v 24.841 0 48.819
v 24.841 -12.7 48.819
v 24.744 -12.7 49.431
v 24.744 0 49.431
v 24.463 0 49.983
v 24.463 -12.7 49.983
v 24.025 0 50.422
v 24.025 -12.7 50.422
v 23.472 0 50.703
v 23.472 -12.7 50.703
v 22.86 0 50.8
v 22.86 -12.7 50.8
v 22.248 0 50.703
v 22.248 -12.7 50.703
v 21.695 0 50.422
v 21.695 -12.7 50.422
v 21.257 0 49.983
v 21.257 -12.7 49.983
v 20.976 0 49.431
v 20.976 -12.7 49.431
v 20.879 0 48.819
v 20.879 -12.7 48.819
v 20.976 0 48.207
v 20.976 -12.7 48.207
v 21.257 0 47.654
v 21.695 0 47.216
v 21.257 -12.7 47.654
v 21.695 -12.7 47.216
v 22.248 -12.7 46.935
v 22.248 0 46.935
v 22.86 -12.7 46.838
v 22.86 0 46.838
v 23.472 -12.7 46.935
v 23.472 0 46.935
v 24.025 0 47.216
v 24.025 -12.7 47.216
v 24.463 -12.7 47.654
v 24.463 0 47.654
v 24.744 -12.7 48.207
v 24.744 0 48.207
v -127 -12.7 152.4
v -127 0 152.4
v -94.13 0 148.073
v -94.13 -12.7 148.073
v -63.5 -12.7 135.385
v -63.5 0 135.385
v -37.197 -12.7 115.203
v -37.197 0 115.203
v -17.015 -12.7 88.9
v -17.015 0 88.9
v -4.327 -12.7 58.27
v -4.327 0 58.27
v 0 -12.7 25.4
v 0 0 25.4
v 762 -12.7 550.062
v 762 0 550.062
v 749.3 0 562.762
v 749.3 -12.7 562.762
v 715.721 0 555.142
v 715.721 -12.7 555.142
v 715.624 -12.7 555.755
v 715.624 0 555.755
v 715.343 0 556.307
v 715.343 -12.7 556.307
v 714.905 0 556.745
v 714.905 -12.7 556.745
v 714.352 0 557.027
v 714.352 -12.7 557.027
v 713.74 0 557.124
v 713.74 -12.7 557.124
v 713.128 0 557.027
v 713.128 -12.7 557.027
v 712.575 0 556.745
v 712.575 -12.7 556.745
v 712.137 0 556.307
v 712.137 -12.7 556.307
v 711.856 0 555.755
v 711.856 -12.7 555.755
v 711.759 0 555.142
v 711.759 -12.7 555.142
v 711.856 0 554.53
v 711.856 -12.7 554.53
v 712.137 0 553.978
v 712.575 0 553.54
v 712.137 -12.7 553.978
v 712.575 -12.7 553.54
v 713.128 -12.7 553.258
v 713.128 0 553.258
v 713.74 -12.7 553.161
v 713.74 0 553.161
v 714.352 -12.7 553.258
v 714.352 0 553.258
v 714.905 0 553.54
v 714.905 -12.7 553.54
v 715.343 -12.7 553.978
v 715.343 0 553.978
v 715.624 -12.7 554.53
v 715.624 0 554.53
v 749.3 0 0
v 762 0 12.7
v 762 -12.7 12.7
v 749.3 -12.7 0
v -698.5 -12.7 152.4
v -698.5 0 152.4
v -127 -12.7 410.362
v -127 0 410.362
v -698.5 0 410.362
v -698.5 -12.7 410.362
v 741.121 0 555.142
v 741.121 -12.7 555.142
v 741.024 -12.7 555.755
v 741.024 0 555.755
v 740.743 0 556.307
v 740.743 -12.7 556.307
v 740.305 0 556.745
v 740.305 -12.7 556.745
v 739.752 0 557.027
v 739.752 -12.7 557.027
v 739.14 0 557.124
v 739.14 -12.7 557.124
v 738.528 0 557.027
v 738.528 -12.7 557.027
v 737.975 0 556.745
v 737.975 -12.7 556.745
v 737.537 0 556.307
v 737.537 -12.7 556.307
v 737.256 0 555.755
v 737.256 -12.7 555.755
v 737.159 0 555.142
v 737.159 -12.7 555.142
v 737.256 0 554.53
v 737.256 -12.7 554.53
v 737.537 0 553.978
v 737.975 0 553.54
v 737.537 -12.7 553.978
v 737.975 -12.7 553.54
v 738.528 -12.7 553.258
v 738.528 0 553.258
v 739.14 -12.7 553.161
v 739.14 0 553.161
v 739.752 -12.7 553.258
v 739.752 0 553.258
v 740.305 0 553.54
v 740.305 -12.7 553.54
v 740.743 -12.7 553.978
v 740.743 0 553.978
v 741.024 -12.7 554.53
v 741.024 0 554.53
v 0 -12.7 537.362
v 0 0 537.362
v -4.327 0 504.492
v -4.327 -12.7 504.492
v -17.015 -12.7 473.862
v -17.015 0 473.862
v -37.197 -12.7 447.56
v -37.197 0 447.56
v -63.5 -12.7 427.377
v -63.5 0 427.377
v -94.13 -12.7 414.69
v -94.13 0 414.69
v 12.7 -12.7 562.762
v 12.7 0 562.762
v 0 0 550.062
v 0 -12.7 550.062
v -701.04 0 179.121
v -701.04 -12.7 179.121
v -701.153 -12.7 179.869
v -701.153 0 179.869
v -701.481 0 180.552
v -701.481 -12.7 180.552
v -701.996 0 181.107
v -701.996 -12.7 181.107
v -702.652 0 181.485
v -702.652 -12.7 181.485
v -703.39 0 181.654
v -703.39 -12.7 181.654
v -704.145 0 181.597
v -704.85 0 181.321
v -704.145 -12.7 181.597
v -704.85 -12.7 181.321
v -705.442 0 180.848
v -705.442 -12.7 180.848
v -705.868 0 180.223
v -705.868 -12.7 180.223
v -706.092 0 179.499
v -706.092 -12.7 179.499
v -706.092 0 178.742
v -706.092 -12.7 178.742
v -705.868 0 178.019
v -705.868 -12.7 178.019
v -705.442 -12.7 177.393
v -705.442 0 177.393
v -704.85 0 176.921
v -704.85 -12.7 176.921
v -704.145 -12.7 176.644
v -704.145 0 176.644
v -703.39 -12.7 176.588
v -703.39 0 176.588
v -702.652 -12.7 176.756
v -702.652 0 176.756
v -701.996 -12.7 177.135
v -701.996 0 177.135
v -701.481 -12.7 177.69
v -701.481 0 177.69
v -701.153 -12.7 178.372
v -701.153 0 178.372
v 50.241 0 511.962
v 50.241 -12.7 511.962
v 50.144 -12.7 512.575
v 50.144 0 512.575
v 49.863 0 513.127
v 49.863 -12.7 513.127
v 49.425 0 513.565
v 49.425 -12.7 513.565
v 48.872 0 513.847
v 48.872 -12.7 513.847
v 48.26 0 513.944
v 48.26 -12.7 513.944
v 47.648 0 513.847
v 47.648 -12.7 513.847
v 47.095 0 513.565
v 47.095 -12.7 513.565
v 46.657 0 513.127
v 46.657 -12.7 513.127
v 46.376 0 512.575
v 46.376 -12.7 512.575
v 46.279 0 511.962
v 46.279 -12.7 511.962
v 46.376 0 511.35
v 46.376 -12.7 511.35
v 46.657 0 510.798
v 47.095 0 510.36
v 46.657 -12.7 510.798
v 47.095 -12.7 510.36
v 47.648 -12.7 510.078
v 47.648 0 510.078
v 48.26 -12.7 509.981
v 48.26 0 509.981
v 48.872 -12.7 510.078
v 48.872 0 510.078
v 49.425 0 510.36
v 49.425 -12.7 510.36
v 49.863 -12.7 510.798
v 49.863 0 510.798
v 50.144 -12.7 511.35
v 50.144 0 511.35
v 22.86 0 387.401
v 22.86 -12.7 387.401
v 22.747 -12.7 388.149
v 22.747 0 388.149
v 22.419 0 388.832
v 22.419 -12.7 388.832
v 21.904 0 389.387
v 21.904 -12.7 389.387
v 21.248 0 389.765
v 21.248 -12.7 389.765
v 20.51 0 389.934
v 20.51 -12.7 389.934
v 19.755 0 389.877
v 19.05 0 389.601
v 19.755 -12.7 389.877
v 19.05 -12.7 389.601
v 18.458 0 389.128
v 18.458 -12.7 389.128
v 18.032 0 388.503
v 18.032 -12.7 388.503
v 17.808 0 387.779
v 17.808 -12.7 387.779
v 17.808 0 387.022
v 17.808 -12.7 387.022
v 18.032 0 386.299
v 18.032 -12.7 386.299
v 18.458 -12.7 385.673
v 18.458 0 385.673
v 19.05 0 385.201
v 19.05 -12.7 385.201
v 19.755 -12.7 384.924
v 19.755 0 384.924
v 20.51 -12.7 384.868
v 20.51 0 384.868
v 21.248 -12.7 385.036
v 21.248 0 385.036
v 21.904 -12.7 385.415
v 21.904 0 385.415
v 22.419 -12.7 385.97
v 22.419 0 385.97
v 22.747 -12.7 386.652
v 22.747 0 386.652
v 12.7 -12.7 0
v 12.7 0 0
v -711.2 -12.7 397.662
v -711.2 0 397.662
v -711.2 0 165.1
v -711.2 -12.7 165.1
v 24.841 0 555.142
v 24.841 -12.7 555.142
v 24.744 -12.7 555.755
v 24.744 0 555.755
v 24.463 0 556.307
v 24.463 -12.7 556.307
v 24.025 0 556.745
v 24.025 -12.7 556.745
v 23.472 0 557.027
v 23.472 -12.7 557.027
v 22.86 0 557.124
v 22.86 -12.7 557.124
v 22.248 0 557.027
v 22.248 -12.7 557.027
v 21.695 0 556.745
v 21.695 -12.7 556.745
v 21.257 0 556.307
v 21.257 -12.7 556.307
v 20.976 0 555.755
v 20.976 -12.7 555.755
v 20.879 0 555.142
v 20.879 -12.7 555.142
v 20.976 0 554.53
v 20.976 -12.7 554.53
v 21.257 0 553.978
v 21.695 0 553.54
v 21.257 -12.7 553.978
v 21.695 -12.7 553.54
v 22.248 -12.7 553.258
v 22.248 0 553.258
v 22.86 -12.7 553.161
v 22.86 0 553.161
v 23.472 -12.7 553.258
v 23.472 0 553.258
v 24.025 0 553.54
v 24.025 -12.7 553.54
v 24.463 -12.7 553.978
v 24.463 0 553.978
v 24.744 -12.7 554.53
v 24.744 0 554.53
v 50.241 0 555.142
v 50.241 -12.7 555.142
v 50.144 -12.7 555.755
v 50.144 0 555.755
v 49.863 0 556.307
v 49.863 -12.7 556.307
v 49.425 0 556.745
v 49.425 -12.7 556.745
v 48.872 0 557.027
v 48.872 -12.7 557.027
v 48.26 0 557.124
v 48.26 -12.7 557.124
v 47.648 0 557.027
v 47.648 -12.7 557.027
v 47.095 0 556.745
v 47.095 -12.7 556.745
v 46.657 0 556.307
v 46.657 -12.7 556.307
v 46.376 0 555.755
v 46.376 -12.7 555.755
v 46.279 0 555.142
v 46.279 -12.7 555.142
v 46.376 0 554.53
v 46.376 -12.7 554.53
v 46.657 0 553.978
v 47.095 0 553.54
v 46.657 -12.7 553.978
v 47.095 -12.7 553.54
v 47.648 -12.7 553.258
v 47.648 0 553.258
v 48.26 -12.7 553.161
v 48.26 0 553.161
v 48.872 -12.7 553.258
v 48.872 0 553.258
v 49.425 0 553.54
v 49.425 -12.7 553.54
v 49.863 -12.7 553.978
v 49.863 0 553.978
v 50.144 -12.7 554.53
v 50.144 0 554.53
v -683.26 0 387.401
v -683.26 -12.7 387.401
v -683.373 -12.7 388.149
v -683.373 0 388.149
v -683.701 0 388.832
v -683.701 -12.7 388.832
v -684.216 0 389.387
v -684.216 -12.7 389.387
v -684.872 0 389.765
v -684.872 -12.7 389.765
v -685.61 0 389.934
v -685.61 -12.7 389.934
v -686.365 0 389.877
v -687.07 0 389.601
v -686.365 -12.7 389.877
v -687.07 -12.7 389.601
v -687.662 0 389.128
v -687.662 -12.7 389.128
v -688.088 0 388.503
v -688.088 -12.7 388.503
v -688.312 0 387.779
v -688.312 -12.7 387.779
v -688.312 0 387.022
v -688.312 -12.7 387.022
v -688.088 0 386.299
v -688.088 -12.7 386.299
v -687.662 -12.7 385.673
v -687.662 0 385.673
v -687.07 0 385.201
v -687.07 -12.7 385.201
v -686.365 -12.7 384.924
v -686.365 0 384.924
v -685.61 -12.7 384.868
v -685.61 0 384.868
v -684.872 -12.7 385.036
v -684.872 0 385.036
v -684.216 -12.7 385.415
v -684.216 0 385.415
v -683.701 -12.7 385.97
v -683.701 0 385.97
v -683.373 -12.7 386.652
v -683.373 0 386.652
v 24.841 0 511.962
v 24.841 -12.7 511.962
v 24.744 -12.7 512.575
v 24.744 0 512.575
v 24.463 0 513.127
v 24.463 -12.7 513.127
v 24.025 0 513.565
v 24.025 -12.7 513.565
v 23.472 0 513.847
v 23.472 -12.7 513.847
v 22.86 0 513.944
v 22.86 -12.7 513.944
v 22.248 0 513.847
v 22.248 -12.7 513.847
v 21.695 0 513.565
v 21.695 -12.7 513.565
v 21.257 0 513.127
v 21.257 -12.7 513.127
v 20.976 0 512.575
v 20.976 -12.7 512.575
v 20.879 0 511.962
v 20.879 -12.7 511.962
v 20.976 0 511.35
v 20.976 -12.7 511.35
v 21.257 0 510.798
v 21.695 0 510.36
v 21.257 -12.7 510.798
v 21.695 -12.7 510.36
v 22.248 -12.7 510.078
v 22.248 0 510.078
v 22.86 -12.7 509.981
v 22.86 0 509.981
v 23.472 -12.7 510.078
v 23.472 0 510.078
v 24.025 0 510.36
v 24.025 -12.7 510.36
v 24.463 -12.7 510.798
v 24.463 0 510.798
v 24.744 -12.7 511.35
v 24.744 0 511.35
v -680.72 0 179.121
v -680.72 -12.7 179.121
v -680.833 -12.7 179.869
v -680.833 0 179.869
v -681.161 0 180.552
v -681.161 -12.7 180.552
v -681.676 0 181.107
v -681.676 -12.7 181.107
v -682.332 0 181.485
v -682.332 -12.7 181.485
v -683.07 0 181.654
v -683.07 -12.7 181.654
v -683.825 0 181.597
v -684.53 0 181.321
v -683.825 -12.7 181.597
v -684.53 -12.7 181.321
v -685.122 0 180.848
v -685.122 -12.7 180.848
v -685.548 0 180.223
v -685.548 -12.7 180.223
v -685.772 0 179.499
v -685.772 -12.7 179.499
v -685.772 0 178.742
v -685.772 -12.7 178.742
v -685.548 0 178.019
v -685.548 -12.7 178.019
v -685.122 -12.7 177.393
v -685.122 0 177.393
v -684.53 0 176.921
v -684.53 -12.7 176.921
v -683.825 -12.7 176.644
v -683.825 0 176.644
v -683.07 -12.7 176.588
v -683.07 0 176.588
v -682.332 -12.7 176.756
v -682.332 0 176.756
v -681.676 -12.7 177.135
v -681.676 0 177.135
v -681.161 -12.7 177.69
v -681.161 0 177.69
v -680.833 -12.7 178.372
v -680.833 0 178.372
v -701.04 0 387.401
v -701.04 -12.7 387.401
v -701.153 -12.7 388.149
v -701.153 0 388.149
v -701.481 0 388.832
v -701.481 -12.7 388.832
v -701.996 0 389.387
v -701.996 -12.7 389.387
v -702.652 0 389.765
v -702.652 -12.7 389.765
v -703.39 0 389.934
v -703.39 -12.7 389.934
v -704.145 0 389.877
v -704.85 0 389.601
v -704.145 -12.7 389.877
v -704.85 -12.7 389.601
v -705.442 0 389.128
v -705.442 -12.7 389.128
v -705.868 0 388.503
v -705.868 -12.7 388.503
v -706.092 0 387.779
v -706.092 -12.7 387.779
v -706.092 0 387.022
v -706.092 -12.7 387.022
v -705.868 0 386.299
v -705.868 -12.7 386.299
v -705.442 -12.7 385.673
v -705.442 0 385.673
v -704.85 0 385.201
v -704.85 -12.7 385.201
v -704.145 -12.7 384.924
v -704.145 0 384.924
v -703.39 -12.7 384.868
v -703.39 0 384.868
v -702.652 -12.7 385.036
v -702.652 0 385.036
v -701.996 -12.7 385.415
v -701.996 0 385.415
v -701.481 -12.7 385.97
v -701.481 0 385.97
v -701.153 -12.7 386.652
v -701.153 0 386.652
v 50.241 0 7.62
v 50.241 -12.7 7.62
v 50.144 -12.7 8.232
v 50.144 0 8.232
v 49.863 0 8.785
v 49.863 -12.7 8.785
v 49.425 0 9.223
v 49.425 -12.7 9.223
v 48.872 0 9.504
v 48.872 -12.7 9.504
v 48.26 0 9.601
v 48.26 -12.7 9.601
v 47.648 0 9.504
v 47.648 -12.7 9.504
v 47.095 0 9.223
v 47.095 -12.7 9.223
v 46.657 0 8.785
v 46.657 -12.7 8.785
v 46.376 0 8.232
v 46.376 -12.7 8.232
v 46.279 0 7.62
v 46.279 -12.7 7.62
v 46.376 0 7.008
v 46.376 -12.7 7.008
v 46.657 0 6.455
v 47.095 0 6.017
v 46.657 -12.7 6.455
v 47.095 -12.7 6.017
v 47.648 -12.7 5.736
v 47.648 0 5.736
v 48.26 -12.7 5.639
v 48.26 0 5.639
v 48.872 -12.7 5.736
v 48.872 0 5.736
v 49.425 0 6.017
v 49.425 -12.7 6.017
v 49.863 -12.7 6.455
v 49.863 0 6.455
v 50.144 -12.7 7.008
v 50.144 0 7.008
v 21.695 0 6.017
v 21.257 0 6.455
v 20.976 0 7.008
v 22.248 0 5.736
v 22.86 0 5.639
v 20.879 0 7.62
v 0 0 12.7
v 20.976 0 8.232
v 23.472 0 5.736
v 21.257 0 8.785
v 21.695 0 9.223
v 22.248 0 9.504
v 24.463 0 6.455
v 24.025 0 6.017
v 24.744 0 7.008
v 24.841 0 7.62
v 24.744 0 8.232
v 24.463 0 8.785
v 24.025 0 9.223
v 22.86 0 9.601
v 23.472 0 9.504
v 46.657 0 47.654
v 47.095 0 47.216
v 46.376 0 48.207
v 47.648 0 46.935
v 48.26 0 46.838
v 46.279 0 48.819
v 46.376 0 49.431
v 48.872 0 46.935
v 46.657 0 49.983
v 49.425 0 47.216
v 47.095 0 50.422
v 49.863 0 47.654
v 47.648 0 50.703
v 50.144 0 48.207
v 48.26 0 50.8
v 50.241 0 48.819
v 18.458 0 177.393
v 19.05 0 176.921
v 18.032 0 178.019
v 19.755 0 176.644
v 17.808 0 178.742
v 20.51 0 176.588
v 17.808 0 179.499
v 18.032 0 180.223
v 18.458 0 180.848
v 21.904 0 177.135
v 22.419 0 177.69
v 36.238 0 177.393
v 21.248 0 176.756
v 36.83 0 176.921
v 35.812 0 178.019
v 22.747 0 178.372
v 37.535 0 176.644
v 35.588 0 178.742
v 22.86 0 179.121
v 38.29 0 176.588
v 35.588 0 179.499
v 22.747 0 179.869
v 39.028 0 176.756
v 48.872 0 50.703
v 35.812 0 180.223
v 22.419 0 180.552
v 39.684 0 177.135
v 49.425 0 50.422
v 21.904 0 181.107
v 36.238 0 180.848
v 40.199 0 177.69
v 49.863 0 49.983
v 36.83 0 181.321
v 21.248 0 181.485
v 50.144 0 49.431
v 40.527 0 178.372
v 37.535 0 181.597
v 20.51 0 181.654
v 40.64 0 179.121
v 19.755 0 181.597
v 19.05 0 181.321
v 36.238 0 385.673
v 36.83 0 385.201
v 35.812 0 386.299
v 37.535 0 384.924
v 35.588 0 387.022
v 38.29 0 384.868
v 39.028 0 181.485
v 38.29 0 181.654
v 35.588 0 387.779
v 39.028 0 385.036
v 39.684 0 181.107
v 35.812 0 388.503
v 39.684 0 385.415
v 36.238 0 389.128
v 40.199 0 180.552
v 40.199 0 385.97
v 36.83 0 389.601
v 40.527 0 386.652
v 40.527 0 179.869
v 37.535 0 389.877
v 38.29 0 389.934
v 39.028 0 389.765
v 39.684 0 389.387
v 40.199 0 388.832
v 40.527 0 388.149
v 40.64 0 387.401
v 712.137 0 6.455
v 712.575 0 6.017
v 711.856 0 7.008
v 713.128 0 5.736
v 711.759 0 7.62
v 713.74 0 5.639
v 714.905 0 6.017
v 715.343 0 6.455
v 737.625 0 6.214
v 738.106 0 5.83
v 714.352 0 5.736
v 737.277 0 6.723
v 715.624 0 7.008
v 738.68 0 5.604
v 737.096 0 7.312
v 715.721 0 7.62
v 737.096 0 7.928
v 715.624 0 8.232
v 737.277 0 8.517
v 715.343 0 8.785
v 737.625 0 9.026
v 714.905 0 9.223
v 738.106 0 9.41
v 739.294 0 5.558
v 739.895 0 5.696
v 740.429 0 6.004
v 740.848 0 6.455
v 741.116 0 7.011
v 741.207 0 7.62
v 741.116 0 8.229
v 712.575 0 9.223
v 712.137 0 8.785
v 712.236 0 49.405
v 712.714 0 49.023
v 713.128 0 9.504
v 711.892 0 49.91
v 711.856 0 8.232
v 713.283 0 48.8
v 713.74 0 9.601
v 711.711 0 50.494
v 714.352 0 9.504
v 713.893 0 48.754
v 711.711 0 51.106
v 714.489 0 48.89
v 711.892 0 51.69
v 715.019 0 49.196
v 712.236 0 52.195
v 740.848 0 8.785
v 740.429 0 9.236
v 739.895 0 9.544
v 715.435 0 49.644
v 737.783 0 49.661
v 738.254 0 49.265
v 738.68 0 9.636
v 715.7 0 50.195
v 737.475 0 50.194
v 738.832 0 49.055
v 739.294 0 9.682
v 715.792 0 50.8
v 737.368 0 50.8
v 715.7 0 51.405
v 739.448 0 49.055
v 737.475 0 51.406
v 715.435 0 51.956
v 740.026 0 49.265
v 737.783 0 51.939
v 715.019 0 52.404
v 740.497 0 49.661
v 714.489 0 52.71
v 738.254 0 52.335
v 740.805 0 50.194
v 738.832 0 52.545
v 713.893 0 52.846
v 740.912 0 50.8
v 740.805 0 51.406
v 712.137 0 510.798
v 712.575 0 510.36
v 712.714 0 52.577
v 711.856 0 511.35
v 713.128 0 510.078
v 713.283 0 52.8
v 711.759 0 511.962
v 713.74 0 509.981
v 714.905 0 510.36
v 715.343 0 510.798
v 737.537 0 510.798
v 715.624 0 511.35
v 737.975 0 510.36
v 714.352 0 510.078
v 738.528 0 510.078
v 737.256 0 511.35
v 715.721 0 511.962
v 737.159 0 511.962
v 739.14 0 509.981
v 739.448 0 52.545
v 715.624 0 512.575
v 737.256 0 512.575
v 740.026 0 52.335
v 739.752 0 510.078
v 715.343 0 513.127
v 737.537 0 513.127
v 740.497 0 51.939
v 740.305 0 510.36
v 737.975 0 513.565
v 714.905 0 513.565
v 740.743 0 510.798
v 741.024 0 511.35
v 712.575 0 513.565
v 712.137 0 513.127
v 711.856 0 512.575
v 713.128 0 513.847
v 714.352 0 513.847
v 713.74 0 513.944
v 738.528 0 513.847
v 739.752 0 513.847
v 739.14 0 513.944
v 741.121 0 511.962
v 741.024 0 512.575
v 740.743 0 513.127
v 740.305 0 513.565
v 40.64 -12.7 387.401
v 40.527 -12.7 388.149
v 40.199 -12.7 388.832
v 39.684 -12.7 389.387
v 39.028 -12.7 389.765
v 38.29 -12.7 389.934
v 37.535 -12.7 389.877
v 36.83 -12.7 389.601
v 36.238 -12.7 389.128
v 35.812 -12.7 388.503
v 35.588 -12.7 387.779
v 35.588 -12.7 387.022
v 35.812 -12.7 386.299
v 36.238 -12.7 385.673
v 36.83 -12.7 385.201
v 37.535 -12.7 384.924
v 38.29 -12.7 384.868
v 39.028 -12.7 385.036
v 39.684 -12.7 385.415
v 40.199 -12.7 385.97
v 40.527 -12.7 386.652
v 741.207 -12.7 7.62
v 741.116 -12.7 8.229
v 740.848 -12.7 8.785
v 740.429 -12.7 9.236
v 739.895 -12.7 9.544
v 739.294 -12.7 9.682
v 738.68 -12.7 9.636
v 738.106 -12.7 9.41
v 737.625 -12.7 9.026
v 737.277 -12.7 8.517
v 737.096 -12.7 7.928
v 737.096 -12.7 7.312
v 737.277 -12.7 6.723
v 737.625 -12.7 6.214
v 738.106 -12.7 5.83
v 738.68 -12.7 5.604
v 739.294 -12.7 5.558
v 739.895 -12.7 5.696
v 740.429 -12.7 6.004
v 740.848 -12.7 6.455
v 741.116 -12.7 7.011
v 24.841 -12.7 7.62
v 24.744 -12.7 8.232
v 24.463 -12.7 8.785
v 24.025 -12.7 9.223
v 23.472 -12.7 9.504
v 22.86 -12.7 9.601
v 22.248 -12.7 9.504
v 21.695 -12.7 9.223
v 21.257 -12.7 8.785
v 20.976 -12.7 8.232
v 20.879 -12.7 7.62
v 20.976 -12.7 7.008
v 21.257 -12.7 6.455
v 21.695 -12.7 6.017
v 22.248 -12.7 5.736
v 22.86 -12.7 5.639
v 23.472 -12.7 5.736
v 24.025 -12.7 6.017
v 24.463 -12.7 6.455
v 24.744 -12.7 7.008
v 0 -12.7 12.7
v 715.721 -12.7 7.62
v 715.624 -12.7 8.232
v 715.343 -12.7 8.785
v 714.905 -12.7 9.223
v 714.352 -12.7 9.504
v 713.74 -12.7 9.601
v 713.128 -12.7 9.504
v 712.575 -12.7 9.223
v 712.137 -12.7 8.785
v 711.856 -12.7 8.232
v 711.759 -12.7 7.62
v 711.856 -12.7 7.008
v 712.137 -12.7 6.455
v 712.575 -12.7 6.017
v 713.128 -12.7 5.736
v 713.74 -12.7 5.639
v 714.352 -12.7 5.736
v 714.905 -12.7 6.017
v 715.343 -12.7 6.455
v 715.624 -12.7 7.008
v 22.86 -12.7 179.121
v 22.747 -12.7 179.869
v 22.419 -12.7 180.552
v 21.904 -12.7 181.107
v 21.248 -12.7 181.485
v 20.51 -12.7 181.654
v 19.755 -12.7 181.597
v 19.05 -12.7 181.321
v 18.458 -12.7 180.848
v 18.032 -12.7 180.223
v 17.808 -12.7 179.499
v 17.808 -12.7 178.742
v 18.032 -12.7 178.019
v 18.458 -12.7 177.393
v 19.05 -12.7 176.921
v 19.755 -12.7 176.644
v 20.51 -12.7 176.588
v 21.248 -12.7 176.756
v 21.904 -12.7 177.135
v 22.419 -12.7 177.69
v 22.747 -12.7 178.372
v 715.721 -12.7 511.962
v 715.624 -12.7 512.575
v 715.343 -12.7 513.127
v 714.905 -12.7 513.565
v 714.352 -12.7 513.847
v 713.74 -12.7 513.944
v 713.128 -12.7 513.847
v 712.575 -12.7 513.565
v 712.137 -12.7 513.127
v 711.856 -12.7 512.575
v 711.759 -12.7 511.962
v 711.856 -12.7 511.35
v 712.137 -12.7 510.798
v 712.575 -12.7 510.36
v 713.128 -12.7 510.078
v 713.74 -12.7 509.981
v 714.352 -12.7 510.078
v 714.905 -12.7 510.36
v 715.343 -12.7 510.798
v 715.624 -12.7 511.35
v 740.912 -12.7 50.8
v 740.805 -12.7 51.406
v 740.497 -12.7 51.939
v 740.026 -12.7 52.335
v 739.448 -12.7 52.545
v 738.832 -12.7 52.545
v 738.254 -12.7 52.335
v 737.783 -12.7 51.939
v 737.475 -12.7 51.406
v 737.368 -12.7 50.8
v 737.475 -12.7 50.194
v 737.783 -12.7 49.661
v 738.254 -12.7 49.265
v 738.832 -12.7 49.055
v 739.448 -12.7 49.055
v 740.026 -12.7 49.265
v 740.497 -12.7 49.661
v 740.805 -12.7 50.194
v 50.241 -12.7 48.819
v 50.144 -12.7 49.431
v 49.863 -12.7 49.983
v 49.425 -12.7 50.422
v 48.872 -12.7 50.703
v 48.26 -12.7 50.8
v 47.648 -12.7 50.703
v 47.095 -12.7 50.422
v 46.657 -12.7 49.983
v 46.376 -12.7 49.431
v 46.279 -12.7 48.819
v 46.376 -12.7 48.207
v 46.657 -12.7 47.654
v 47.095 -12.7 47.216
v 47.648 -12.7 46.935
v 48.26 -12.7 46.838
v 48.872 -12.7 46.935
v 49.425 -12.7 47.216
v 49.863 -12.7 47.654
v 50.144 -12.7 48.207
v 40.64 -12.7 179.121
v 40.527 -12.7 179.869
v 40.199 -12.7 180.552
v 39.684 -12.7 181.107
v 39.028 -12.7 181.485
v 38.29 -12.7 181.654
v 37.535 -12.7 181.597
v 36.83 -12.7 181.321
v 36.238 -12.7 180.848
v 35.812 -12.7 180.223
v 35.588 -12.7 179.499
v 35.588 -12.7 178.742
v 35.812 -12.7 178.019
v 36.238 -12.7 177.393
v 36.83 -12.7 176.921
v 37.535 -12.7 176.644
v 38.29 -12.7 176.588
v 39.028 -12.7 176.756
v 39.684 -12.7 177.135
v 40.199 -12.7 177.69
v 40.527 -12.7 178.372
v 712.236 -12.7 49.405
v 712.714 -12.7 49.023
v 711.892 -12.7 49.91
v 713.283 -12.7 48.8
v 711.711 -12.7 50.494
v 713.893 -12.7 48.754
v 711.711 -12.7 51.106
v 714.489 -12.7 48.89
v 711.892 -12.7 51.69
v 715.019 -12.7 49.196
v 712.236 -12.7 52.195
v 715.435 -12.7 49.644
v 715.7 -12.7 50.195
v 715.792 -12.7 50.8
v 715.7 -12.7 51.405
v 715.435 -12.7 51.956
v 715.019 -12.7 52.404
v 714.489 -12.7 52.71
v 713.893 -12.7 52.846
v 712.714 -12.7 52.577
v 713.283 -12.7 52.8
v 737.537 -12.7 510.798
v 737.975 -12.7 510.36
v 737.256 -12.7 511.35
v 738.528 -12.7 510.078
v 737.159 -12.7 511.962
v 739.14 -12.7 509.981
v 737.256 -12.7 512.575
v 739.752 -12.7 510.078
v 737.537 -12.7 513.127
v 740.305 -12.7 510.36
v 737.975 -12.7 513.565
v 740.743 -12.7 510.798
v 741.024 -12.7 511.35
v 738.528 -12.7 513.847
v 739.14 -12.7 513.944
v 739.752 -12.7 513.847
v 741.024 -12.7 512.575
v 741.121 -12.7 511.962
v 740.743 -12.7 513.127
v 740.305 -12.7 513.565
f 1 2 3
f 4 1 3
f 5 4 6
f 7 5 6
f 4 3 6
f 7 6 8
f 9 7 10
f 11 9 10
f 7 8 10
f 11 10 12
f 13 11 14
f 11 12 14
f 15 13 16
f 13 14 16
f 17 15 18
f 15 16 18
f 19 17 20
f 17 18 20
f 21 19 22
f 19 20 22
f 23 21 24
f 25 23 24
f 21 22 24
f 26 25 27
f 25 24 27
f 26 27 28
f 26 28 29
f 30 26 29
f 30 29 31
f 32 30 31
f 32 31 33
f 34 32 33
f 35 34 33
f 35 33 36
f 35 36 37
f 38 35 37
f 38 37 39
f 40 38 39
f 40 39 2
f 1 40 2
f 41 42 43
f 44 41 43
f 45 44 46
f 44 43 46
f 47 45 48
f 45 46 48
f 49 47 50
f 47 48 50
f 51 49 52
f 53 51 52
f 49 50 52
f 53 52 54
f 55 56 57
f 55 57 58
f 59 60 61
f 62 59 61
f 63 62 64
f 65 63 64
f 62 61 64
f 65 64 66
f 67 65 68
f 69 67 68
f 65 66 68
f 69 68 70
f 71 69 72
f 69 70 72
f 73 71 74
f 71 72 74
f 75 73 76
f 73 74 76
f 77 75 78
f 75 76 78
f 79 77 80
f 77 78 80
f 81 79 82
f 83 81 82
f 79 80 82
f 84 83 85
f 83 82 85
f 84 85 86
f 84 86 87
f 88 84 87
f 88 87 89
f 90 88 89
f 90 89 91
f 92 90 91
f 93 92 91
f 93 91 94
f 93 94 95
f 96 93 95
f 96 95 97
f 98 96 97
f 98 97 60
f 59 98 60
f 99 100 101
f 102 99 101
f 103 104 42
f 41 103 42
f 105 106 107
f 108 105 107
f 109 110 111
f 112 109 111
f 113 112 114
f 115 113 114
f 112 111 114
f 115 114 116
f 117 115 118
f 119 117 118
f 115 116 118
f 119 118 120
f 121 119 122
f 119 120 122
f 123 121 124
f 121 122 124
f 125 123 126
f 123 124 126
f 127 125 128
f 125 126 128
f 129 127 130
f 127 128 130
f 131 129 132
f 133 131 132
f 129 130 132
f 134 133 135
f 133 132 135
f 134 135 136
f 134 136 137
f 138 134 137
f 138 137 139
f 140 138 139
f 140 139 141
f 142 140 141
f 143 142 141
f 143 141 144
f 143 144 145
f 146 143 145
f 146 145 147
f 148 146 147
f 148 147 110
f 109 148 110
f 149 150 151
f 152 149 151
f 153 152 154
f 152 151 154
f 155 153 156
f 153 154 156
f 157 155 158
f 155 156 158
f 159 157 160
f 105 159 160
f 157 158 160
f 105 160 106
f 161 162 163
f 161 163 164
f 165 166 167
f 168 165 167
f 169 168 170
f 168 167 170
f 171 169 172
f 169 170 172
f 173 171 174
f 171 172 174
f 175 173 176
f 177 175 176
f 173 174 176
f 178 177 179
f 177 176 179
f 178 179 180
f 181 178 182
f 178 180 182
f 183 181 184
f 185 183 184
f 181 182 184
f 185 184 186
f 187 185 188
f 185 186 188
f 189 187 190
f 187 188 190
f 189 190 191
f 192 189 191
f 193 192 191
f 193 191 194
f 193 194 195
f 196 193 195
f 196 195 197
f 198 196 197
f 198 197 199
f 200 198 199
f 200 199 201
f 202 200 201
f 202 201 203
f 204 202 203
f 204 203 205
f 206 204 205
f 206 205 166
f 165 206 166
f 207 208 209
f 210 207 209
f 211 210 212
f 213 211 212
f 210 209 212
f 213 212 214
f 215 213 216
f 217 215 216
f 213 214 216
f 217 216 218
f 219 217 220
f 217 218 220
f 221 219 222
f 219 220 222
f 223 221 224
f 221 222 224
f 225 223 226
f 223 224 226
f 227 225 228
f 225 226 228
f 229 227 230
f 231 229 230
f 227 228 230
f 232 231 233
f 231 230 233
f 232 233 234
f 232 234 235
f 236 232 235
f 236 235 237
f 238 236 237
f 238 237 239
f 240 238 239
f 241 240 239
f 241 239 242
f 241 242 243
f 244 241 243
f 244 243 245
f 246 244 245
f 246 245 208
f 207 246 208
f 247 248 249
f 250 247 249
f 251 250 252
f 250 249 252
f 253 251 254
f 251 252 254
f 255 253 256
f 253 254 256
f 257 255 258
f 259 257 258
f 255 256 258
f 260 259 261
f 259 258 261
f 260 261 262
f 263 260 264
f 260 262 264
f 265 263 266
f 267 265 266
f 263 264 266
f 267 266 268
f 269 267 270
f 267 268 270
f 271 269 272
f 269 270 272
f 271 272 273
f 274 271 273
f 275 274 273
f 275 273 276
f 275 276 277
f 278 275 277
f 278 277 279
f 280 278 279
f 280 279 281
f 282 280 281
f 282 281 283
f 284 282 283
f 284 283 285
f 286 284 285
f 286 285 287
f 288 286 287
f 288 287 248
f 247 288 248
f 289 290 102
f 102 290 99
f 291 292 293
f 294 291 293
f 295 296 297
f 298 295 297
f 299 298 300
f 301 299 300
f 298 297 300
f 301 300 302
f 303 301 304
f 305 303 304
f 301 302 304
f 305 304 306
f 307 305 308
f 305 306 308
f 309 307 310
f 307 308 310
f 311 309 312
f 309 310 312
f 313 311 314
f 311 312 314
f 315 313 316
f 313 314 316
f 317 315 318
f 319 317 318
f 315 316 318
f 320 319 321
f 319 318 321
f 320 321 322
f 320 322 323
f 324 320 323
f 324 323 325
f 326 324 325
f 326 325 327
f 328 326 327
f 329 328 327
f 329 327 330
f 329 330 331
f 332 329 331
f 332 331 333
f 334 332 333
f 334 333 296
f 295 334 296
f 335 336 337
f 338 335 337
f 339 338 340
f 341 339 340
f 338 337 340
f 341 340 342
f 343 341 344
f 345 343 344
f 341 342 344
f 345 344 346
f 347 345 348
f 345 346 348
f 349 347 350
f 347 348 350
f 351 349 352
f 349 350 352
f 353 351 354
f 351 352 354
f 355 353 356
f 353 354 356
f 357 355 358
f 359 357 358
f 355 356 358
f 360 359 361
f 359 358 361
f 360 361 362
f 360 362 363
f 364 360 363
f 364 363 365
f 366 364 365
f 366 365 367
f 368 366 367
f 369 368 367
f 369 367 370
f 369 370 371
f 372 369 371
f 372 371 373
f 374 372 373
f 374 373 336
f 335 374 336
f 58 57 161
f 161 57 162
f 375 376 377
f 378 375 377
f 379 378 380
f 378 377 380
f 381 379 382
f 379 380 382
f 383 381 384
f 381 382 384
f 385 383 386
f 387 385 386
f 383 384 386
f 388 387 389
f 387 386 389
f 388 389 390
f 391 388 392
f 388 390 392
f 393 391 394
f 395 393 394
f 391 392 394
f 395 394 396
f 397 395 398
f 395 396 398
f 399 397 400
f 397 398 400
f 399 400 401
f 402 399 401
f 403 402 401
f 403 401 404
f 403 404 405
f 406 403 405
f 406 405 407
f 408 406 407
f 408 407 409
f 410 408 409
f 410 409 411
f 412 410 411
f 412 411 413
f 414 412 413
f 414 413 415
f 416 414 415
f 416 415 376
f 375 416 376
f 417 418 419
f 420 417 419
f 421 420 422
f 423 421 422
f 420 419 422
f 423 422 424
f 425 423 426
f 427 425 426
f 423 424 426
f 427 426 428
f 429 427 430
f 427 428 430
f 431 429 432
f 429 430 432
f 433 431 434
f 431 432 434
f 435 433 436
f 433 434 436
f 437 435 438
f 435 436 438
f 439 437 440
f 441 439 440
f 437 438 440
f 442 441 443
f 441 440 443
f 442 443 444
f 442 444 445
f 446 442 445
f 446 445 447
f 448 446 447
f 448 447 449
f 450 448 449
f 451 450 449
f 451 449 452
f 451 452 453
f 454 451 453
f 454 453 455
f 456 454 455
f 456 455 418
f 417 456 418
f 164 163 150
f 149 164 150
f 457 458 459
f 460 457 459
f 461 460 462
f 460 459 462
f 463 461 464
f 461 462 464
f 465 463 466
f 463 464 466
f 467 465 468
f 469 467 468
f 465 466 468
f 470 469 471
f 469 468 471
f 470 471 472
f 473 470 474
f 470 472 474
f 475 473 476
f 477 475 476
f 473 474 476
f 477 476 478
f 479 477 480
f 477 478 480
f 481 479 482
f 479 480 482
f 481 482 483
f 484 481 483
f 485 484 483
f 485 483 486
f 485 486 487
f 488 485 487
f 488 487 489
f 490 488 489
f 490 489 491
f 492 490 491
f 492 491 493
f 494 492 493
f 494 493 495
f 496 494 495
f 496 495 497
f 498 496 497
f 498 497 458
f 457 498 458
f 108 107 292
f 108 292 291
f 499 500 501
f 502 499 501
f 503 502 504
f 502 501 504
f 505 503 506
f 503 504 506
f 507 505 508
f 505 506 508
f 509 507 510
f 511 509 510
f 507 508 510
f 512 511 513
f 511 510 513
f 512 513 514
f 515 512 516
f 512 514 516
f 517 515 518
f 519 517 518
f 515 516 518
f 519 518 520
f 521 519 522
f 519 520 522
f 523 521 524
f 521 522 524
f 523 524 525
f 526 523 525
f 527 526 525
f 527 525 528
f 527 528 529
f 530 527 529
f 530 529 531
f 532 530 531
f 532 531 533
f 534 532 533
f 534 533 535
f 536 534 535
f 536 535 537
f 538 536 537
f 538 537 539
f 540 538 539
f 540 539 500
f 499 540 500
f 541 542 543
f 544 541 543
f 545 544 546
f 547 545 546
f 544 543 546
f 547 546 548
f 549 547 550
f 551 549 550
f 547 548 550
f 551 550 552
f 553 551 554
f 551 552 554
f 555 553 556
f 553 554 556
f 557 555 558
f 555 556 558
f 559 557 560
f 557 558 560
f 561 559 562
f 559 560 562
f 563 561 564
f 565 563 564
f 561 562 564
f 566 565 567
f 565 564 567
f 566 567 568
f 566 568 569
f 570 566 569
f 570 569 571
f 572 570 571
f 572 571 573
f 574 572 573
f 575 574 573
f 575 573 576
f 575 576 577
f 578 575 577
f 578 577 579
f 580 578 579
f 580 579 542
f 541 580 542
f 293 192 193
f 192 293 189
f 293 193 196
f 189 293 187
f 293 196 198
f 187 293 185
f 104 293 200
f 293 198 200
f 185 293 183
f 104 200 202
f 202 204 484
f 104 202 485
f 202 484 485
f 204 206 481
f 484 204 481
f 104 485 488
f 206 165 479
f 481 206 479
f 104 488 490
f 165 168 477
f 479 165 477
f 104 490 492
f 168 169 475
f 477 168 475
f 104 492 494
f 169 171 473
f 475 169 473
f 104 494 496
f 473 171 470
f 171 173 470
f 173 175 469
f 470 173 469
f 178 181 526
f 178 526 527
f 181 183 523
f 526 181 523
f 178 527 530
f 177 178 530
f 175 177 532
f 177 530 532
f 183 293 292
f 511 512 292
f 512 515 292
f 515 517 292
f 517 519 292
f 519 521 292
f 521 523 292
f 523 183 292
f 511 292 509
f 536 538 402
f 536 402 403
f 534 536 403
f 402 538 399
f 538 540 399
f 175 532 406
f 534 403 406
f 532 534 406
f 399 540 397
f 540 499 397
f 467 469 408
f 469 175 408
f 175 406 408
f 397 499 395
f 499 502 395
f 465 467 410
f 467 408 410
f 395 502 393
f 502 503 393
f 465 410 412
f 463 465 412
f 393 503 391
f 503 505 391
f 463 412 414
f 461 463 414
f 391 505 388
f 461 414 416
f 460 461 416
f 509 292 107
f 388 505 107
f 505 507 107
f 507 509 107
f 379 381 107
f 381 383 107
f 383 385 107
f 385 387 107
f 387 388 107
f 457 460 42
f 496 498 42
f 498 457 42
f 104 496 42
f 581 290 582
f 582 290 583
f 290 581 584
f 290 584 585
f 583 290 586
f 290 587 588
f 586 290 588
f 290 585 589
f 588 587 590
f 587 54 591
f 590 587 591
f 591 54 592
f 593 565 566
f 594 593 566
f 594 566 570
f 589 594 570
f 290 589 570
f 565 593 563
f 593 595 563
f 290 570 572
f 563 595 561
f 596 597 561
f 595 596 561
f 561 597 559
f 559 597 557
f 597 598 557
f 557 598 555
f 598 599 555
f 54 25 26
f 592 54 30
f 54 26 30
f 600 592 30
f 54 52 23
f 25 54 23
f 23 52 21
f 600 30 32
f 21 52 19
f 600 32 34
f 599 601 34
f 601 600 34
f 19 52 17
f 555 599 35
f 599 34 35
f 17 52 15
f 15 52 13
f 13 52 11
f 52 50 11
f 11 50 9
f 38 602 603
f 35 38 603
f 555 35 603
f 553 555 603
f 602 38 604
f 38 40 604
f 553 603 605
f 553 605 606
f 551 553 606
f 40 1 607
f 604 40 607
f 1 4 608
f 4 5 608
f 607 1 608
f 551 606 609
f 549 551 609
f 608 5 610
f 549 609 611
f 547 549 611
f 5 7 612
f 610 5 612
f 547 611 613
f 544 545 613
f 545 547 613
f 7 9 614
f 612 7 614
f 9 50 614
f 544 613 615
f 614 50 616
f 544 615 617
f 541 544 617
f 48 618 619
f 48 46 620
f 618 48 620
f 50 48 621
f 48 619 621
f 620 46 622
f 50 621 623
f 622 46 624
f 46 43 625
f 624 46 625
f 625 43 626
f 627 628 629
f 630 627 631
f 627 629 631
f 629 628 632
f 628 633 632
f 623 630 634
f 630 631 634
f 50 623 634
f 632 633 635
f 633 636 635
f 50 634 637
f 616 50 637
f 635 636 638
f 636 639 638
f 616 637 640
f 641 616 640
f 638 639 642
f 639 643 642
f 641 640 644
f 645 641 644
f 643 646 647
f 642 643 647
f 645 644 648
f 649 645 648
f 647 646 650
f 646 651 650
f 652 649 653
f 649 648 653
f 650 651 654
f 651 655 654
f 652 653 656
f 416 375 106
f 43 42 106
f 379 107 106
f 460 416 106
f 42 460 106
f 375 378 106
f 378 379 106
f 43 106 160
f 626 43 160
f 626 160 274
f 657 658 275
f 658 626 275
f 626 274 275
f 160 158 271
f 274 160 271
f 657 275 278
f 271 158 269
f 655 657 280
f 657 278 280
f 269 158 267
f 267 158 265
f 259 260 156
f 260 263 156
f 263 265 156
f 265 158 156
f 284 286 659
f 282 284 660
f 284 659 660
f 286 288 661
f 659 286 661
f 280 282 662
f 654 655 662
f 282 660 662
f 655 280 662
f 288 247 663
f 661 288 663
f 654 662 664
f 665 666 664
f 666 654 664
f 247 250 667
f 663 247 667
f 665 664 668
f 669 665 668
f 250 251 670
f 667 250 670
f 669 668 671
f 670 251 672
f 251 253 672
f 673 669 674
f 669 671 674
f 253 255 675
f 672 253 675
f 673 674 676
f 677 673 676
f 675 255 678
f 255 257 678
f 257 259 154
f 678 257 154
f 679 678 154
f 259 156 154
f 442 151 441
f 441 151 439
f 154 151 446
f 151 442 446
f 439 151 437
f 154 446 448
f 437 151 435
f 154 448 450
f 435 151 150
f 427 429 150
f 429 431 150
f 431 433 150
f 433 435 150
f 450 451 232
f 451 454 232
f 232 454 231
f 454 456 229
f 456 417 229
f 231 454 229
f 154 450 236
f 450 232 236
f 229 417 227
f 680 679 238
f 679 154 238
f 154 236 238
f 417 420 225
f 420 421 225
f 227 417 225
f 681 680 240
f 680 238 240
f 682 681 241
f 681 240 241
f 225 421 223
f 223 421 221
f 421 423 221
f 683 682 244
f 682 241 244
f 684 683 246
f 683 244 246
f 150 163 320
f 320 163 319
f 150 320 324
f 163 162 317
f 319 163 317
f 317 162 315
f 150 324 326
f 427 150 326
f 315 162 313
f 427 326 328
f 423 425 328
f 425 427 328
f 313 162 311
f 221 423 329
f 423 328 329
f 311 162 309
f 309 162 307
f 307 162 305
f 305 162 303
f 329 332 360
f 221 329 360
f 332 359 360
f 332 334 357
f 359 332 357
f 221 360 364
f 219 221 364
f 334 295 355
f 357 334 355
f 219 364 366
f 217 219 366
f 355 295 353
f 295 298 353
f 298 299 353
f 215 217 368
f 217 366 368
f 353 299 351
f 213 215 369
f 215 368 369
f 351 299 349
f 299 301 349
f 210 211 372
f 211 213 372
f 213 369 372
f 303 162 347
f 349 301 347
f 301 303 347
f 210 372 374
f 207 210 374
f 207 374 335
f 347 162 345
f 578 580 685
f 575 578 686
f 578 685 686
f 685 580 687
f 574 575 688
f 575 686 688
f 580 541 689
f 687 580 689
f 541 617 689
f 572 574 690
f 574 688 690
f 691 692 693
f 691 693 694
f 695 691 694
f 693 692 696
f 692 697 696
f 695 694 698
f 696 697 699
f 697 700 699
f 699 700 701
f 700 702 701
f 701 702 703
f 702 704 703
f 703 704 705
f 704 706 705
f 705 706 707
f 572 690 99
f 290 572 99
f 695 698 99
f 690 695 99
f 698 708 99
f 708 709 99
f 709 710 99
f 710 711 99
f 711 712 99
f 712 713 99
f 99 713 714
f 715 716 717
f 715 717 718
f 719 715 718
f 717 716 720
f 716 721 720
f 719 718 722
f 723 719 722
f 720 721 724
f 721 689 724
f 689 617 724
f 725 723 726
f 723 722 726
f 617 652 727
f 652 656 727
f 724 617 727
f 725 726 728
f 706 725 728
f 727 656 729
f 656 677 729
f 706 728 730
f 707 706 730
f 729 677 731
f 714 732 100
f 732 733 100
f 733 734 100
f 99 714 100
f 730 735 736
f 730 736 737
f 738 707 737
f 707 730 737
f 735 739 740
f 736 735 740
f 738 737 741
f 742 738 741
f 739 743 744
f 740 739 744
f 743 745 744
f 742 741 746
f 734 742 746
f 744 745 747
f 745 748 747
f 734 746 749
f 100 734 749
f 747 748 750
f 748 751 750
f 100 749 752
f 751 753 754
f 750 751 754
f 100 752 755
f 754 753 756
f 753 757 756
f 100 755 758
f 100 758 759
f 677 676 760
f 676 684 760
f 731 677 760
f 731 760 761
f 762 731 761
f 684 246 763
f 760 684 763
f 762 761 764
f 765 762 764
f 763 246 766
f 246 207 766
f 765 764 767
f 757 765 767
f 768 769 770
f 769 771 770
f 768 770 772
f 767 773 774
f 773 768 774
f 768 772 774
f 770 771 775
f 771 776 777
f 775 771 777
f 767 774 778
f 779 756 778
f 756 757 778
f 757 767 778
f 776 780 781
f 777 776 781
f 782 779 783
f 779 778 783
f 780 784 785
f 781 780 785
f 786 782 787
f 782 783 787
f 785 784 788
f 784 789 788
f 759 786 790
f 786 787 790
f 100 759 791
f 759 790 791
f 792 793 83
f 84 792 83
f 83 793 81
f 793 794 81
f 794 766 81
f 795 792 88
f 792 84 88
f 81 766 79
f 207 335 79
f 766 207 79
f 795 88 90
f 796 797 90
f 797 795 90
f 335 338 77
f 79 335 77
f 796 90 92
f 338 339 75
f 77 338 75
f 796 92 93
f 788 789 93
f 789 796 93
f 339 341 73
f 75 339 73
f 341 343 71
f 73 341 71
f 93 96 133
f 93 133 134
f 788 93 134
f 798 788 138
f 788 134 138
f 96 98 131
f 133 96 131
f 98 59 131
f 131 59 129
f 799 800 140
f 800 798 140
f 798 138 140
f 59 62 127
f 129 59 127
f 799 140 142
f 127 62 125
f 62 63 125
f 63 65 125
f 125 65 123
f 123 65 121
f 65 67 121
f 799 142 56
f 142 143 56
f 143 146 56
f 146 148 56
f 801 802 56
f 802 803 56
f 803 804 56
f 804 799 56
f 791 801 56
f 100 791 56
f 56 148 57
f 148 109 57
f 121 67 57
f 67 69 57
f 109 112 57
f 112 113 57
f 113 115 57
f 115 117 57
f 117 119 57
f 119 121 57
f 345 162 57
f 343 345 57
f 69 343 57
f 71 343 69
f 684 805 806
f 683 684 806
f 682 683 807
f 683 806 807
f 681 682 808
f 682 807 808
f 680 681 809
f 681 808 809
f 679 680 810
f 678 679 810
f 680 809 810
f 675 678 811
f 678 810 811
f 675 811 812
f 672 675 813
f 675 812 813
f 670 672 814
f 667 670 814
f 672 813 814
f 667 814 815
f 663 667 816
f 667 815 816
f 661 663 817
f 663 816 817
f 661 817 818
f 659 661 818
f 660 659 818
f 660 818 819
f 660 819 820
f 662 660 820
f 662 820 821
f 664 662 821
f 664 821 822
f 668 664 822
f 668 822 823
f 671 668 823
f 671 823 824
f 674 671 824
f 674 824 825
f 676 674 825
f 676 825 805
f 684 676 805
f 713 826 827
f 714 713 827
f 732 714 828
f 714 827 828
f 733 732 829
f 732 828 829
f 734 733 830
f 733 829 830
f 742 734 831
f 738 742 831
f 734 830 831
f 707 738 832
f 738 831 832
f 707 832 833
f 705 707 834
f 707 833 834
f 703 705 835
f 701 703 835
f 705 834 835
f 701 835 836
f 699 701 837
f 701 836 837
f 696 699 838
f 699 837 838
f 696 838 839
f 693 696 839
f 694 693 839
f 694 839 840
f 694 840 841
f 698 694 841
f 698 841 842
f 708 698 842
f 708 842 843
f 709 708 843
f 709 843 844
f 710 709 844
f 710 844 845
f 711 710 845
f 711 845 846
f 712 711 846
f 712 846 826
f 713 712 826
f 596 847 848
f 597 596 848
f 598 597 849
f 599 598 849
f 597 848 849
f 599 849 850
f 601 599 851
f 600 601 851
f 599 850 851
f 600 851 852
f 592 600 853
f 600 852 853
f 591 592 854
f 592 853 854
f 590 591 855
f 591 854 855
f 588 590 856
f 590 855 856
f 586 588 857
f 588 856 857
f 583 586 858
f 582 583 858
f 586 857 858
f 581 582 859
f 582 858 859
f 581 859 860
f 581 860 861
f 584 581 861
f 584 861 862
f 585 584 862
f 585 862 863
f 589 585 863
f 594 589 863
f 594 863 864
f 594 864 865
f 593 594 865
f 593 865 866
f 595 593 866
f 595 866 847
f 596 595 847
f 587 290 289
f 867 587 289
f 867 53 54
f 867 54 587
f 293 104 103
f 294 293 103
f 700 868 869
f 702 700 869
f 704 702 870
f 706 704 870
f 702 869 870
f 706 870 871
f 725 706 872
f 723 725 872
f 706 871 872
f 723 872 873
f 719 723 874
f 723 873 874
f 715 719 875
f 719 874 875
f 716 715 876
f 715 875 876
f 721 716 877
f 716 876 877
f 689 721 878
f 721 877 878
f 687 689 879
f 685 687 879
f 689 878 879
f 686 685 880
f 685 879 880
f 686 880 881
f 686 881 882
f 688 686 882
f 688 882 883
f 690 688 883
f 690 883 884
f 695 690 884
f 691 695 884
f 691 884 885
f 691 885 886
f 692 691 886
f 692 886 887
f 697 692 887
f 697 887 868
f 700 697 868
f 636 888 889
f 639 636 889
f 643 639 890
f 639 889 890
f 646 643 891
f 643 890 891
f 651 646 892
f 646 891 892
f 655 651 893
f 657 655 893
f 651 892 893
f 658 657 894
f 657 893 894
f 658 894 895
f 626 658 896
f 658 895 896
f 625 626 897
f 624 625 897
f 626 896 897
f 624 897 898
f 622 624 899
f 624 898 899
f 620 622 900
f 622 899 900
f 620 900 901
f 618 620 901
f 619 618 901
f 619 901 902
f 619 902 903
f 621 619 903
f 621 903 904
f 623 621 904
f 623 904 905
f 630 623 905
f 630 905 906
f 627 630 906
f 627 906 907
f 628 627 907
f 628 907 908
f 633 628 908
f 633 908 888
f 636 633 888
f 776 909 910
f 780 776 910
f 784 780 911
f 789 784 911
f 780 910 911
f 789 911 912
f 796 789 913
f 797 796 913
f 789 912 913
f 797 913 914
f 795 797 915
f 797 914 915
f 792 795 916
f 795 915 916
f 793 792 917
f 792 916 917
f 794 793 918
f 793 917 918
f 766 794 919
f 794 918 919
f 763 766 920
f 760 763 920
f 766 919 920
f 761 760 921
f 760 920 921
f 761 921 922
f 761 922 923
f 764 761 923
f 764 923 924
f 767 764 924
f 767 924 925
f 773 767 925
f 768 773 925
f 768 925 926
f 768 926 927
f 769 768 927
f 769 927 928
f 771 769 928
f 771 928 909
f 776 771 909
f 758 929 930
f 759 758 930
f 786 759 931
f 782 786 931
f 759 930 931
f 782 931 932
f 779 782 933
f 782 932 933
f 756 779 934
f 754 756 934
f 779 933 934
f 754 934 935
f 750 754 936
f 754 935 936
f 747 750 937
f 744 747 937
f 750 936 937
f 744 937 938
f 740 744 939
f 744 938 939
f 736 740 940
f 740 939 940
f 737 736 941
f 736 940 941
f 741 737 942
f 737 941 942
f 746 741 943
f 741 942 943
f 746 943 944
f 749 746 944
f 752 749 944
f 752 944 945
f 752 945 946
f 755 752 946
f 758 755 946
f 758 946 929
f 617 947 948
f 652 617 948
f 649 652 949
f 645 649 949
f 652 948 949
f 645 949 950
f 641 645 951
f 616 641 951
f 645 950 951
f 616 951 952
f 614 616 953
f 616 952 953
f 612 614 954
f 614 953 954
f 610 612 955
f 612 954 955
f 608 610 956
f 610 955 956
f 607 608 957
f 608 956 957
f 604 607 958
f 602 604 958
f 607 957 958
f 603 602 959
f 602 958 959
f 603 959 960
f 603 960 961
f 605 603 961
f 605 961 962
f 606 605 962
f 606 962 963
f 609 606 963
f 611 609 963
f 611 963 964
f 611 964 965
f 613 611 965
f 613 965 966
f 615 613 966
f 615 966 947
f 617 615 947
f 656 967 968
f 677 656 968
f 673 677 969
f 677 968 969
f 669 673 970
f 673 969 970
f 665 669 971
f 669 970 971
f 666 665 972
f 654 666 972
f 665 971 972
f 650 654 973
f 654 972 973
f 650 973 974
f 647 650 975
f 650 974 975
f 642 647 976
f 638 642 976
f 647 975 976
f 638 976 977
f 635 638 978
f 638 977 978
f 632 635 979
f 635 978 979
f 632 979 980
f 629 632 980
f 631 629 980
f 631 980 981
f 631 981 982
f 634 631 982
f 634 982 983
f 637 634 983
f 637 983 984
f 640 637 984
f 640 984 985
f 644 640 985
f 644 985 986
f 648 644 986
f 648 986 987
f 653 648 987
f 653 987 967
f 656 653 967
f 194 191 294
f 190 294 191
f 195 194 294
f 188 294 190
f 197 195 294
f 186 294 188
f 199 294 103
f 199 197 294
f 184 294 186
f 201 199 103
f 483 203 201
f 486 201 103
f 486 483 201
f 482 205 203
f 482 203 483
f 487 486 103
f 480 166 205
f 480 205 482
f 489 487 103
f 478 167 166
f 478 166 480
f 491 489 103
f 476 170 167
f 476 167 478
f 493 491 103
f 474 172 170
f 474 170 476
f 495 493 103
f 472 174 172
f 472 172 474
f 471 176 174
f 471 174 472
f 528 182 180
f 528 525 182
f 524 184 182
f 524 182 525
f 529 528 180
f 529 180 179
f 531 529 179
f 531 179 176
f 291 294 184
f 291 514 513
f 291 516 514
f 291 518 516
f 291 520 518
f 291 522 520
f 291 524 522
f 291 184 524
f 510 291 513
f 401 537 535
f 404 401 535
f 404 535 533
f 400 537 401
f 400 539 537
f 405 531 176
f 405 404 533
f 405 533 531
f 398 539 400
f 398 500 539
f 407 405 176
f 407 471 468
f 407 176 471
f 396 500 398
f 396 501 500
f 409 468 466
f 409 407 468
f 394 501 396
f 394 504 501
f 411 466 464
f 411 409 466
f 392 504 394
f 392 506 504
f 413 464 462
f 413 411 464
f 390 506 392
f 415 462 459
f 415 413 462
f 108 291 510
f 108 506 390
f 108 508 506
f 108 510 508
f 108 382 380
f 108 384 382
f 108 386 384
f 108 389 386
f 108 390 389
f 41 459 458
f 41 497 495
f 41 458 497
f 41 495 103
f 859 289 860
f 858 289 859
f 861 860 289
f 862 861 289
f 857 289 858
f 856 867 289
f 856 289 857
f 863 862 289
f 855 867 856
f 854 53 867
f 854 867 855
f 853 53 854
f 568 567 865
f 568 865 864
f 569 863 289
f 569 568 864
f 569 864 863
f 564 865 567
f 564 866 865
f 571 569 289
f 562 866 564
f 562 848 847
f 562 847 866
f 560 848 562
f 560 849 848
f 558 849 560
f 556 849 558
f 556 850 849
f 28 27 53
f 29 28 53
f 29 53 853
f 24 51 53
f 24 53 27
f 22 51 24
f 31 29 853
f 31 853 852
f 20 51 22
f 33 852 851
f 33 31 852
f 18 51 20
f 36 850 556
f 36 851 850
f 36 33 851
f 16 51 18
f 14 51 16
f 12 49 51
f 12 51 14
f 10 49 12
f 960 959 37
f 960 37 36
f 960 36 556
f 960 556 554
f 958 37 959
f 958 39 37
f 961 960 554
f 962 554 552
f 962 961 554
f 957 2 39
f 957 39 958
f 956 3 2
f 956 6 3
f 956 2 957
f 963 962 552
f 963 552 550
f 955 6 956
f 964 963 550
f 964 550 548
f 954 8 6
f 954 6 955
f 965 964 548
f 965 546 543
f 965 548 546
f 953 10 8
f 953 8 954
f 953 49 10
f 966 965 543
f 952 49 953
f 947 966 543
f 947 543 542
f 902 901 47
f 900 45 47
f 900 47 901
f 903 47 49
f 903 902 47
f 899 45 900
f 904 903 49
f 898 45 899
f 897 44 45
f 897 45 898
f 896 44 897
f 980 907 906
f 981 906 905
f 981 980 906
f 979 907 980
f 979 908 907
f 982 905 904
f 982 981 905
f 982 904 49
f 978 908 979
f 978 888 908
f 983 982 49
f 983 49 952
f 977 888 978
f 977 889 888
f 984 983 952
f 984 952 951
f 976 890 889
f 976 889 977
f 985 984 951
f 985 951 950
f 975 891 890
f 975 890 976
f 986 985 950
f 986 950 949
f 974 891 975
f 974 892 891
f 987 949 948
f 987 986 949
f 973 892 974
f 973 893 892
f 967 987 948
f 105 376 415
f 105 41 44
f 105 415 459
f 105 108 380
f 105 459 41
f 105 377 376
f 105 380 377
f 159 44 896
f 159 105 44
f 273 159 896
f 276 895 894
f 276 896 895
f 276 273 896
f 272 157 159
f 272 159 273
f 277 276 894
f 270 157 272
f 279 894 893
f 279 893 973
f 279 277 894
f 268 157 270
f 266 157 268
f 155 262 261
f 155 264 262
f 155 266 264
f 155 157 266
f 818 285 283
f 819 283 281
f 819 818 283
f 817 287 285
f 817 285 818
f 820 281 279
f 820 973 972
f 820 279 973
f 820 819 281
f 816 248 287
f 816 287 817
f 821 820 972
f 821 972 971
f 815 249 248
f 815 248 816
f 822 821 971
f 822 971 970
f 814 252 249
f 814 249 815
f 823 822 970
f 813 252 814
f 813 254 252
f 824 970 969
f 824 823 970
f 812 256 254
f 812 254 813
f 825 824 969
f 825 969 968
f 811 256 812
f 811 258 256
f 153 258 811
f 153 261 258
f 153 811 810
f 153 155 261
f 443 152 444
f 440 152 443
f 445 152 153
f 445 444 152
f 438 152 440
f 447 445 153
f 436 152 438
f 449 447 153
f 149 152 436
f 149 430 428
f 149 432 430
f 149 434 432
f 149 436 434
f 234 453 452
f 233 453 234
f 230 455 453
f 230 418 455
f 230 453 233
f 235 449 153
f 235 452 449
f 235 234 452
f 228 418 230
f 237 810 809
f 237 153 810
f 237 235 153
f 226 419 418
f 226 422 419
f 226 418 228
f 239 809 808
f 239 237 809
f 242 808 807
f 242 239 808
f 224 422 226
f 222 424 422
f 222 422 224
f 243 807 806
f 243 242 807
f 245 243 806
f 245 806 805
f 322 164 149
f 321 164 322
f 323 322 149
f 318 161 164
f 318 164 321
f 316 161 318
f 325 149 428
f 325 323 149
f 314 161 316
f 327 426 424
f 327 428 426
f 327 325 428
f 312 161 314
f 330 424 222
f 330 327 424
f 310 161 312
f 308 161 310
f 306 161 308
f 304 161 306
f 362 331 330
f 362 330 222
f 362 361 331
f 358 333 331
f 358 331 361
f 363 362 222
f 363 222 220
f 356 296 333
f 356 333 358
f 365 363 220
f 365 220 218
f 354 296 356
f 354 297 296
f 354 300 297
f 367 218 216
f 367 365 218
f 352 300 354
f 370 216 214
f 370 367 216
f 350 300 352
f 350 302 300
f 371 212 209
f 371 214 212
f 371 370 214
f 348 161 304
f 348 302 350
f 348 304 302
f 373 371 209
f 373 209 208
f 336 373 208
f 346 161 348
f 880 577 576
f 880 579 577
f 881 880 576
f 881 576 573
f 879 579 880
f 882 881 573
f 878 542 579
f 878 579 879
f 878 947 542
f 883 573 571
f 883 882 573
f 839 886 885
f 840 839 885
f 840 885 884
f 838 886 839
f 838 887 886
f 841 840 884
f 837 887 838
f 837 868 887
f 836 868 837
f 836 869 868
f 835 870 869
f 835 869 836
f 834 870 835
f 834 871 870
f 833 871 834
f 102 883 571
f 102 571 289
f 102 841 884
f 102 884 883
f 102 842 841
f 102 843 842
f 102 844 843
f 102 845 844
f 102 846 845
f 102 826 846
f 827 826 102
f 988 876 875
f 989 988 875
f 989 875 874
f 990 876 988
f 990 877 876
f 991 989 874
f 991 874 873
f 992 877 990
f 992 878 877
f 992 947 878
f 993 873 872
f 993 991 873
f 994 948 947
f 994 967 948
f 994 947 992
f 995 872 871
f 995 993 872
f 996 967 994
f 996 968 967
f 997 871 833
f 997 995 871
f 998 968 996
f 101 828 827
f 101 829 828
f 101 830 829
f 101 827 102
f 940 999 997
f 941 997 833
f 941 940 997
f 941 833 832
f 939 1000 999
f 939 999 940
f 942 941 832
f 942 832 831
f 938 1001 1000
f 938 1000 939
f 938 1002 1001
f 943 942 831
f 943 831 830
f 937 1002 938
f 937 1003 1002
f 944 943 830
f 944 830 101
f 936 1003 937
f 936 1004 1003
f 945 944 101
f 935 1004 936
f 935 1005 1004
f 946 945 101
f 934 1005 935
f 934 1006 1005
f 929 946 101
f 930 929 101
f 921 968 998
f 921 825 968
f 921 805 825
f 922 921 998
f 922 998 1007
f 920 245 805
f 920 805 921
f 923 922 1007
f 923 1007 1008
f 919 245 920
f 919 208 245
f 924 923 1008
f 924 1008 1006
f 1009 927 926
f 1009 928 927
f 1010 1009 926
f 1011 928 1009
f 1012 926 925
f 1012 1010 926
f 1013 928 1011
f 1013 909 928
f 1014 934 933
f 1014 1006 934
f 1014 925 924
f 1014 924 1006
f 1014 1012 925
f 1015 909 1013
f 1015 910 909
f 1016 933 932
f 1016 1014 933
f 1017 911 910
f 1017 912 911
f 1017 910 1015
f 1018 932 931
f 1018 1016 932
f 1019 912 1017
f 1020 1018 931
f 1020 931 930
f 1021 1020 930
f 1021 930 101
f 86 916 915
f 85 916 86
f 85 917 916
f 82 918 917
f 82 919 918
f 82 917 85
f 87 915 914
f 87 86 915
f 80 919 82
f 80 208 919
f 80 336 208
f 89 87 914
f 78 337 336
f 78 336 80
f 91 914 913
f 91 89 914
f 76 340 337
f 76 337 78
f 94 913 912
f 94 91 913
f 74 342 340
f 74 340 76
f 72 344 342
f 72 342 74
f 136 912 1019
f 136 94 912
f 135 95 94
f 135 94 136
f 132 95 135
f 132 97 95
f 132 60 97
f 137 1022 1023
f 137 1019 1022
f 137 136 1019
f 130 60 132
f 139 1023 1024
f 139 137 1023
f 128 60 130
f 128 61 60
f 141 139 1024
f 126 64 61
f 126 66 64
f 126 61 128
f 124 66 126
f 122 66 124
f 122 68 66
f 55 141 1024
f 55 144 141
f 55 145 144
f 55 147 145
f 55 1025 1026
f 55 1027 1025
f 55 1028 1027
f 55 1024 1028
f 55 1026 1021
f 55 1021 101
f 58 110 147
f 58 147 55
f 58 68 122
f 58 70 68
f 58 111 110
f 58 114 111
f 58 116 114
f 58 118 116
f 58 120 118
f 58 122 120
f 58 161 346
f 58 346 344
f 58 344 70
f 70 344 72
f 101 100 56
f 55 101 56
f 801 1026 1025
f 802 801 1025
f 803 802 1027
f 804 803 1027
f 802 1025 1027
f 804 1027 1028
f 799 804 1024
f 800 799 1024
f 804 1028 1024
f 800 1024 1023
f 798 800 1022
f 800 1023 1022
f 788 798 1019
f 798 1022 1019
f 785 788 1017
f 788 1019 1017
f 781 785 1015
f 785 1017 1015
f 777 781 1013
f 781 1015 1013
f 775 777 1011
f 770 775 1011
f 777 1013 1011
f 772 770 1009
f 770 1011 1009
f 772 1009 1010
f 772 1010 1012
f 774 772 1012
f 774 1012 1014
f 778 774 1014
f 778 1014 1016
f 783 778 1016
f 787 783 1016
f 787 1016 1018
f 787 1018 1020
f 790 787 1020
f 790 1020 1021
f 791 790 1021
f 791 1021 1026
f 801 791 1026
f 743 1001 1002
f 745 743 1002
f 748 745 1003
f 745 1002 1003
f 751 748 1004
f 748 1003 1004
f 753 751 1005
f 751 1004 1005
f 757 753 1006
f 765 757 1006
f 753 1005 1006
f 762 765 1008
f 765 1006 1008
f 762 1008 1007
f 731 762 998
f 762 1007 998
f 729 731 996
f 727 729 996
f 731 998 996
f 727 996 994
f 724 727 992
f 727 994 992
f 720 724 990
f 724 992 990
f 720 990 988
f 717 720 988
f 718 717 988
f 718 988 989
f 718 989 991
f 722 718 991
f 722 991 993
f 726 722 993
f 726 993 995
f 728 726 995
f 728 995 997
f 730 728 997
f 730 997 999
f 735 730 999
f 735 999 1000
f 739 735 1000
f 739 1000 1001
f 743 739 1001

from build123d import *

# Parameters (mm, degrees)
F1_DEPTH = 12.7
F2_SIZE  = 12.7
F4_R     = 1.9812
F4_R_2   = 2.067369
F4_R_3   = 1.772036
F4_R_4   = 2.051504
F5_DEPTH = 12.701
F6_R     = 2.54
F7_DEPTH = 12.701


with BuildPart() as f1:
    # F0 (on Front) → F1 (new body)
    with BuildSketch(Plane.XZ):
        with BuildLine():
            Line((0, 25.4), (0, 0))
            Line((0, 0), (762, 0))
            Line((762, 0), (762, 562.7624))
            Line((762, 562.7624), (0, 562.7624))
            Line((0, 562.7624), (0, 537.3624))
            ThreePointArc((0, 537.3624), (-37.197439, 447.559839), (-127, 410.3624))
            Line((-127, 410.3624), (-711.2, 410.3624))
            Line((-711.2, 410.3624), (-711.2, 152.4))
            Line((-711.2, 152.4), (-127, 152.4))
            ThreePointArc((-127, 152.4), (-37.197439, 115.202561), (0, 25.4))
        make_face()
    extrude(amount=F1_DEPTH)

    # F2
    f2_edges = [f1.edges().sort_by_distance(p)[0] for p in [
        (-711.2, -6.35, 410.3624),
        (-711.2, -6.35, 152.4),
        (0, -6.35, 0),
        (0, -6.35, 562.7624),
        (762, -6.35, 562.7624),
        (762, -6.35, 0),
    ]]
    chamfer(f2_edges, length=F2_SIZE)

    # F4 (on face) → F5 (cut, through all)
    with BuildSketch(Plane.XZ.offset(12.7)):
        with Locations((713.74, 7.62)):
            Circle(F4_R)
        with Locations((739.14, 7.62)):
            Circle(F4_R_2)
        with Locations((739.14, 50.8)):
            Circle(F4_R_3)
        with Locations((713.74, 50.8)):
            Circle(F4_R_4)
        with Locations((713.74, 555.1424)):
            Circle(F4_R)
        with Locations((739.14, 555.1424)):
            Circle(F4_R)
        with Locations((739.14, 511.9624)):
            Circle(F4_R)
        with Locations((713.74, 511.9624)):
            Circle(F4_R)
        with Locations((22.86, 555.1424)):
            Circle(F4_R)
        with Locations((48.26, 555.1424)):
            Circle(F4_R)
        with Locations((48.26, 511.9624)):
            Circle(F4_R)
        with Locations((22.86, 511.9624)):
            Circle(F4_R)
        with Locations((22.86, 7.62)):
            Circle(F4_R)
        with Locations((48.26, 7.62)):
            Circle(F4_R)
        with Locations((48.26, 48.8188)):
            Circle(F4_R)
        with Locations((22.86, 48.8188)):
            Circle(F4_R)
    extrude(amount=-F5_DEPTH, mode=Mode.SUBTRACT)

    # F6 (on face) → F7 (cut, through all)
    with BuildSketch(Plane.XZ.offset(12.7)):
        with Locations((-703.58, 387.4008)):
            Circle(F6_R)
        with Locations((-685.8, 387.4008)):
            Circle(F6_R)
        with Locations((20.32, 387.4008)):
            Circle(F6_R)
        with Locations((38.1, 387.4008)):
            Circle(F6_R)
        with Locations((-703.58, 179.1208)):
            Circle(F6_R)
        with Locations((-683.26, 179.1208)):
            Circle(F6_R)
        with Locations((20.32, 179.1208)):
            Circle(F6_R)
        with Locations((38.1, 179.1208)):
            Circle(F6_R)
    extrude(amount=-F7_DEPTH, mode=Mode.SUBTRACT)


solid = f1.part
